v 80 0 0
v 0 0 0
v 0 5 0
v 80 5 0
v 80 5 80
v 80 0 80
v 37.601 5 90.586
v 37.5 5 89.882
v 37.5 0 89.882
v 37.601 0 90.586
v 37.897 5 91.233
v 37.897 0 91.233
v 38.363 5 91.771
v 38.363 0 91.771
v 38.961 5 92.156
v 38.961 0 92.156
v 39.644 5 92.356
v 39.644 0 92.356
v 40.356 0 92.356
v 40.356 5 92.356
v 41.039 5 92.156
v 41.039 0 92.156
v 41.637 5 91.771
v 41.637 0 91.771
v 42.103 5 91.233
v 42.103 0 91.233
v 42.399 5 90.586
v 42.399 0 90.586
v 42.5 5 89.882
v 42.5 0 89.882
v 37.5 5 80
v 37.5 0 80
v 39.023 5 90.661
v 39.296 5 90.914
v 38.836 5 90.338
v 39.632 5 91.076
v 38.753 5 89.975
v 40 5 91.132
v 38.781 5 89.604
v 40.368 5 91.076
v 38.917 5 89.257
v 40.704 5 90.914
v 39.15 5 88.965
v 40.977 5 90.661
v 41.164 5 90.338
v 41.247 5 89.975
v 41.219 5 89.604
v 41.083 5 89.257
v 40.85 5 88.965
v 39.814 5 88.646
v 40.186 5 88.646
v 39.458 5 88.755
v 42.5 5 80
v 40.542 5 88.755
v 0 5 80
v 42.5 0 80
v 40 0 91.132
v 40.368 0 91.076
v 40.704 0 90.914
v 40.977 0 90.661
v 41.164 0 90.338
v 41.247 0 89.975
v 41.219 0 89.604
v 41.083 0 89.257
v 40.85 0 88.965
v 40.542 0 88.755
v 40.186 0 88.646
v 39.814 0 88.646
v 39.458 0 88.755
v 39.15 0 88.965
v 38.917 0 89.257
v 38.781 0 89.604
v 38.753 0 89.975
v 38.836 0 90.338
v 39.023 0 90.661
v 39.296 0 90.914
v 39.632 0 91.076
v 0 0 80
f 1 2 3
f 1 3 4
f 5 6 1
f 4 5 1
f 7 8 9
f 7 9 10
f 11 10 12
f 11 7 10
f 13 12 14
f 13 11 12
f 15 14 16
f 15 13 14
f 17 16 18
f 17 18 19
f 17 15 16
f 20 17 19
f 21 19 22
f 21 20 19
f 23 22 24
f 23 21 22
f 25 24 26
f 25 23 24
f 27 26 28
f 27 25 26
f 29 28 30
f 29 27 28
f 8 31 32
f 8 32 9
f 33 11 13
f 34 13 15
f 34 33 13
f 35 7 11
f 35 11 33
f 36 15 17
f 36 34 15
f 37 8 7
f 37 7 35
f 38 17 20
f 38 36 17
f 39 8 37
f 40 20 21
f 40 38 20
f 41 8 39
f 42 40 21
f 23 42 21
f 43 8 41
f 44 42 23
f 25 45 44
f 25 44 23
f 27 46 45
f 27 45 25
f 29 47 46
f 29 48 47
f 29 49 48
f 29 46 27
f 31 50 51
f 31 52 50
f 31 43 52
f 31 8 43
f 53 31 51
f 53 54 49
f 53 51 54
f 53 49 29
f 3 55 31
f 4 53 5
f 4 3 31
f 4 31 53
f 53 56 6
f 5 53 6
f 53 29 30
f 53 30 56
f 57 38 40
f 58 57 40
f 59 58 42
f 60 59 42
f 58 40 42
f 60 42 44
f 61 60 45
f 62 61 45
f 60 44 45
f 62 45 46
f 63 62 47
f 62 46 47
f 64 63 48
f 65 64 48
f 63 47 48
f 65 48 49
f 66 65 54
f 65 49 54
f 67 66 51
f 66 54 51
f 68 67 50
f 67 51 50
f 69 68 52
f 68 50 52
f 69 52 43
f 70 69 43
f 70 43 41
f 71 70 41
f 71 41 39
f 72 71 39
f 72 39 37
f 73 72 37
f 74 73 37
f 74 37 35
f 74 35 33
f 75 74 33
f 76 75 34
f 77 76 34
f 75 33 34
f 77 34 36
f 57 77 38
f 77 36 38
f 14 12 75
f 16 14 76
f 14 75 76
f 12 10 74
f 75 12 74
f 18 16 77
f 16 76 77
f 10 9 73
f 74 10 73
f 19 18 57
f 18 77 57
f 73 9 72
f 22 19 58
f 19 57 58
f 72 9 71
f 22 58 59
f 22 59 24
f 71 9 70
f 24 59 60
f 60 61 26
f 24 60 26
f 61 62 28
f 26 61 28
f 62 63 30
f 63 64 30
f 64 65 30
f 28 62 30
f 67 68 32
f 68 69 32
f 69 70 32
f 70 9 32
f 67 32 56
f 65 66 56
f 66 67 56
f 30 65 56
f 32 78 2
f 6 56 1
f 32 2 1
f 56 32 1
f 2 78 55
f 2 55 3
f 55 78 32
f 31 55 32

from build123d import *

# Parameters (mm, degrees)
SKETCH2_W           = 80
SKETCH2_H           = 80
BOSS_EXTRUDE1_DEPTH = 5
SKETCH3_R           = 1.25
BOSS_EXTRUDE2_DEPTH = 5


with BuildPart() as part:
    # Sketch2 → Boss-Extrude1 (new body)
    with BuildSketch(Plane(origin=(0, 0, 0), x_dir=(1, 0, 0), z_dir=(0, 1, 0))):
        with Locations((40, -40)):
            Rectangle(SKETCH2_W, SKETCH2_H)
    extrude(amount=BOSS_EXTRUDE1_DEPTH)

    # Sketch3 → Boss-Extrude2 (add)
    with BuildSketch(Plane(origin=(0, 5, 0), x_dir=(1, 0, 0), z_dir=(0, 1, 0))):
        with BuildLine():
            Line((37.5, -80), (37.5, -89.881652202))
            ThreePointArc((37.5, -89.881652202), (40, -92.381652202), (42.5, -89.881652202))
            Line((42.5, -89.881652202), (42.5, -80))
            Line((42.5, -80), (37.5, -80))
        make_face()
        with Locations((40, -89.881652202)):
            Circle(SKETCH3_R, mode=Mode.SUBTRACT)
    extrude(amount=-BOSS_EXTRUDE2_DEPTH)


solid = part.part
